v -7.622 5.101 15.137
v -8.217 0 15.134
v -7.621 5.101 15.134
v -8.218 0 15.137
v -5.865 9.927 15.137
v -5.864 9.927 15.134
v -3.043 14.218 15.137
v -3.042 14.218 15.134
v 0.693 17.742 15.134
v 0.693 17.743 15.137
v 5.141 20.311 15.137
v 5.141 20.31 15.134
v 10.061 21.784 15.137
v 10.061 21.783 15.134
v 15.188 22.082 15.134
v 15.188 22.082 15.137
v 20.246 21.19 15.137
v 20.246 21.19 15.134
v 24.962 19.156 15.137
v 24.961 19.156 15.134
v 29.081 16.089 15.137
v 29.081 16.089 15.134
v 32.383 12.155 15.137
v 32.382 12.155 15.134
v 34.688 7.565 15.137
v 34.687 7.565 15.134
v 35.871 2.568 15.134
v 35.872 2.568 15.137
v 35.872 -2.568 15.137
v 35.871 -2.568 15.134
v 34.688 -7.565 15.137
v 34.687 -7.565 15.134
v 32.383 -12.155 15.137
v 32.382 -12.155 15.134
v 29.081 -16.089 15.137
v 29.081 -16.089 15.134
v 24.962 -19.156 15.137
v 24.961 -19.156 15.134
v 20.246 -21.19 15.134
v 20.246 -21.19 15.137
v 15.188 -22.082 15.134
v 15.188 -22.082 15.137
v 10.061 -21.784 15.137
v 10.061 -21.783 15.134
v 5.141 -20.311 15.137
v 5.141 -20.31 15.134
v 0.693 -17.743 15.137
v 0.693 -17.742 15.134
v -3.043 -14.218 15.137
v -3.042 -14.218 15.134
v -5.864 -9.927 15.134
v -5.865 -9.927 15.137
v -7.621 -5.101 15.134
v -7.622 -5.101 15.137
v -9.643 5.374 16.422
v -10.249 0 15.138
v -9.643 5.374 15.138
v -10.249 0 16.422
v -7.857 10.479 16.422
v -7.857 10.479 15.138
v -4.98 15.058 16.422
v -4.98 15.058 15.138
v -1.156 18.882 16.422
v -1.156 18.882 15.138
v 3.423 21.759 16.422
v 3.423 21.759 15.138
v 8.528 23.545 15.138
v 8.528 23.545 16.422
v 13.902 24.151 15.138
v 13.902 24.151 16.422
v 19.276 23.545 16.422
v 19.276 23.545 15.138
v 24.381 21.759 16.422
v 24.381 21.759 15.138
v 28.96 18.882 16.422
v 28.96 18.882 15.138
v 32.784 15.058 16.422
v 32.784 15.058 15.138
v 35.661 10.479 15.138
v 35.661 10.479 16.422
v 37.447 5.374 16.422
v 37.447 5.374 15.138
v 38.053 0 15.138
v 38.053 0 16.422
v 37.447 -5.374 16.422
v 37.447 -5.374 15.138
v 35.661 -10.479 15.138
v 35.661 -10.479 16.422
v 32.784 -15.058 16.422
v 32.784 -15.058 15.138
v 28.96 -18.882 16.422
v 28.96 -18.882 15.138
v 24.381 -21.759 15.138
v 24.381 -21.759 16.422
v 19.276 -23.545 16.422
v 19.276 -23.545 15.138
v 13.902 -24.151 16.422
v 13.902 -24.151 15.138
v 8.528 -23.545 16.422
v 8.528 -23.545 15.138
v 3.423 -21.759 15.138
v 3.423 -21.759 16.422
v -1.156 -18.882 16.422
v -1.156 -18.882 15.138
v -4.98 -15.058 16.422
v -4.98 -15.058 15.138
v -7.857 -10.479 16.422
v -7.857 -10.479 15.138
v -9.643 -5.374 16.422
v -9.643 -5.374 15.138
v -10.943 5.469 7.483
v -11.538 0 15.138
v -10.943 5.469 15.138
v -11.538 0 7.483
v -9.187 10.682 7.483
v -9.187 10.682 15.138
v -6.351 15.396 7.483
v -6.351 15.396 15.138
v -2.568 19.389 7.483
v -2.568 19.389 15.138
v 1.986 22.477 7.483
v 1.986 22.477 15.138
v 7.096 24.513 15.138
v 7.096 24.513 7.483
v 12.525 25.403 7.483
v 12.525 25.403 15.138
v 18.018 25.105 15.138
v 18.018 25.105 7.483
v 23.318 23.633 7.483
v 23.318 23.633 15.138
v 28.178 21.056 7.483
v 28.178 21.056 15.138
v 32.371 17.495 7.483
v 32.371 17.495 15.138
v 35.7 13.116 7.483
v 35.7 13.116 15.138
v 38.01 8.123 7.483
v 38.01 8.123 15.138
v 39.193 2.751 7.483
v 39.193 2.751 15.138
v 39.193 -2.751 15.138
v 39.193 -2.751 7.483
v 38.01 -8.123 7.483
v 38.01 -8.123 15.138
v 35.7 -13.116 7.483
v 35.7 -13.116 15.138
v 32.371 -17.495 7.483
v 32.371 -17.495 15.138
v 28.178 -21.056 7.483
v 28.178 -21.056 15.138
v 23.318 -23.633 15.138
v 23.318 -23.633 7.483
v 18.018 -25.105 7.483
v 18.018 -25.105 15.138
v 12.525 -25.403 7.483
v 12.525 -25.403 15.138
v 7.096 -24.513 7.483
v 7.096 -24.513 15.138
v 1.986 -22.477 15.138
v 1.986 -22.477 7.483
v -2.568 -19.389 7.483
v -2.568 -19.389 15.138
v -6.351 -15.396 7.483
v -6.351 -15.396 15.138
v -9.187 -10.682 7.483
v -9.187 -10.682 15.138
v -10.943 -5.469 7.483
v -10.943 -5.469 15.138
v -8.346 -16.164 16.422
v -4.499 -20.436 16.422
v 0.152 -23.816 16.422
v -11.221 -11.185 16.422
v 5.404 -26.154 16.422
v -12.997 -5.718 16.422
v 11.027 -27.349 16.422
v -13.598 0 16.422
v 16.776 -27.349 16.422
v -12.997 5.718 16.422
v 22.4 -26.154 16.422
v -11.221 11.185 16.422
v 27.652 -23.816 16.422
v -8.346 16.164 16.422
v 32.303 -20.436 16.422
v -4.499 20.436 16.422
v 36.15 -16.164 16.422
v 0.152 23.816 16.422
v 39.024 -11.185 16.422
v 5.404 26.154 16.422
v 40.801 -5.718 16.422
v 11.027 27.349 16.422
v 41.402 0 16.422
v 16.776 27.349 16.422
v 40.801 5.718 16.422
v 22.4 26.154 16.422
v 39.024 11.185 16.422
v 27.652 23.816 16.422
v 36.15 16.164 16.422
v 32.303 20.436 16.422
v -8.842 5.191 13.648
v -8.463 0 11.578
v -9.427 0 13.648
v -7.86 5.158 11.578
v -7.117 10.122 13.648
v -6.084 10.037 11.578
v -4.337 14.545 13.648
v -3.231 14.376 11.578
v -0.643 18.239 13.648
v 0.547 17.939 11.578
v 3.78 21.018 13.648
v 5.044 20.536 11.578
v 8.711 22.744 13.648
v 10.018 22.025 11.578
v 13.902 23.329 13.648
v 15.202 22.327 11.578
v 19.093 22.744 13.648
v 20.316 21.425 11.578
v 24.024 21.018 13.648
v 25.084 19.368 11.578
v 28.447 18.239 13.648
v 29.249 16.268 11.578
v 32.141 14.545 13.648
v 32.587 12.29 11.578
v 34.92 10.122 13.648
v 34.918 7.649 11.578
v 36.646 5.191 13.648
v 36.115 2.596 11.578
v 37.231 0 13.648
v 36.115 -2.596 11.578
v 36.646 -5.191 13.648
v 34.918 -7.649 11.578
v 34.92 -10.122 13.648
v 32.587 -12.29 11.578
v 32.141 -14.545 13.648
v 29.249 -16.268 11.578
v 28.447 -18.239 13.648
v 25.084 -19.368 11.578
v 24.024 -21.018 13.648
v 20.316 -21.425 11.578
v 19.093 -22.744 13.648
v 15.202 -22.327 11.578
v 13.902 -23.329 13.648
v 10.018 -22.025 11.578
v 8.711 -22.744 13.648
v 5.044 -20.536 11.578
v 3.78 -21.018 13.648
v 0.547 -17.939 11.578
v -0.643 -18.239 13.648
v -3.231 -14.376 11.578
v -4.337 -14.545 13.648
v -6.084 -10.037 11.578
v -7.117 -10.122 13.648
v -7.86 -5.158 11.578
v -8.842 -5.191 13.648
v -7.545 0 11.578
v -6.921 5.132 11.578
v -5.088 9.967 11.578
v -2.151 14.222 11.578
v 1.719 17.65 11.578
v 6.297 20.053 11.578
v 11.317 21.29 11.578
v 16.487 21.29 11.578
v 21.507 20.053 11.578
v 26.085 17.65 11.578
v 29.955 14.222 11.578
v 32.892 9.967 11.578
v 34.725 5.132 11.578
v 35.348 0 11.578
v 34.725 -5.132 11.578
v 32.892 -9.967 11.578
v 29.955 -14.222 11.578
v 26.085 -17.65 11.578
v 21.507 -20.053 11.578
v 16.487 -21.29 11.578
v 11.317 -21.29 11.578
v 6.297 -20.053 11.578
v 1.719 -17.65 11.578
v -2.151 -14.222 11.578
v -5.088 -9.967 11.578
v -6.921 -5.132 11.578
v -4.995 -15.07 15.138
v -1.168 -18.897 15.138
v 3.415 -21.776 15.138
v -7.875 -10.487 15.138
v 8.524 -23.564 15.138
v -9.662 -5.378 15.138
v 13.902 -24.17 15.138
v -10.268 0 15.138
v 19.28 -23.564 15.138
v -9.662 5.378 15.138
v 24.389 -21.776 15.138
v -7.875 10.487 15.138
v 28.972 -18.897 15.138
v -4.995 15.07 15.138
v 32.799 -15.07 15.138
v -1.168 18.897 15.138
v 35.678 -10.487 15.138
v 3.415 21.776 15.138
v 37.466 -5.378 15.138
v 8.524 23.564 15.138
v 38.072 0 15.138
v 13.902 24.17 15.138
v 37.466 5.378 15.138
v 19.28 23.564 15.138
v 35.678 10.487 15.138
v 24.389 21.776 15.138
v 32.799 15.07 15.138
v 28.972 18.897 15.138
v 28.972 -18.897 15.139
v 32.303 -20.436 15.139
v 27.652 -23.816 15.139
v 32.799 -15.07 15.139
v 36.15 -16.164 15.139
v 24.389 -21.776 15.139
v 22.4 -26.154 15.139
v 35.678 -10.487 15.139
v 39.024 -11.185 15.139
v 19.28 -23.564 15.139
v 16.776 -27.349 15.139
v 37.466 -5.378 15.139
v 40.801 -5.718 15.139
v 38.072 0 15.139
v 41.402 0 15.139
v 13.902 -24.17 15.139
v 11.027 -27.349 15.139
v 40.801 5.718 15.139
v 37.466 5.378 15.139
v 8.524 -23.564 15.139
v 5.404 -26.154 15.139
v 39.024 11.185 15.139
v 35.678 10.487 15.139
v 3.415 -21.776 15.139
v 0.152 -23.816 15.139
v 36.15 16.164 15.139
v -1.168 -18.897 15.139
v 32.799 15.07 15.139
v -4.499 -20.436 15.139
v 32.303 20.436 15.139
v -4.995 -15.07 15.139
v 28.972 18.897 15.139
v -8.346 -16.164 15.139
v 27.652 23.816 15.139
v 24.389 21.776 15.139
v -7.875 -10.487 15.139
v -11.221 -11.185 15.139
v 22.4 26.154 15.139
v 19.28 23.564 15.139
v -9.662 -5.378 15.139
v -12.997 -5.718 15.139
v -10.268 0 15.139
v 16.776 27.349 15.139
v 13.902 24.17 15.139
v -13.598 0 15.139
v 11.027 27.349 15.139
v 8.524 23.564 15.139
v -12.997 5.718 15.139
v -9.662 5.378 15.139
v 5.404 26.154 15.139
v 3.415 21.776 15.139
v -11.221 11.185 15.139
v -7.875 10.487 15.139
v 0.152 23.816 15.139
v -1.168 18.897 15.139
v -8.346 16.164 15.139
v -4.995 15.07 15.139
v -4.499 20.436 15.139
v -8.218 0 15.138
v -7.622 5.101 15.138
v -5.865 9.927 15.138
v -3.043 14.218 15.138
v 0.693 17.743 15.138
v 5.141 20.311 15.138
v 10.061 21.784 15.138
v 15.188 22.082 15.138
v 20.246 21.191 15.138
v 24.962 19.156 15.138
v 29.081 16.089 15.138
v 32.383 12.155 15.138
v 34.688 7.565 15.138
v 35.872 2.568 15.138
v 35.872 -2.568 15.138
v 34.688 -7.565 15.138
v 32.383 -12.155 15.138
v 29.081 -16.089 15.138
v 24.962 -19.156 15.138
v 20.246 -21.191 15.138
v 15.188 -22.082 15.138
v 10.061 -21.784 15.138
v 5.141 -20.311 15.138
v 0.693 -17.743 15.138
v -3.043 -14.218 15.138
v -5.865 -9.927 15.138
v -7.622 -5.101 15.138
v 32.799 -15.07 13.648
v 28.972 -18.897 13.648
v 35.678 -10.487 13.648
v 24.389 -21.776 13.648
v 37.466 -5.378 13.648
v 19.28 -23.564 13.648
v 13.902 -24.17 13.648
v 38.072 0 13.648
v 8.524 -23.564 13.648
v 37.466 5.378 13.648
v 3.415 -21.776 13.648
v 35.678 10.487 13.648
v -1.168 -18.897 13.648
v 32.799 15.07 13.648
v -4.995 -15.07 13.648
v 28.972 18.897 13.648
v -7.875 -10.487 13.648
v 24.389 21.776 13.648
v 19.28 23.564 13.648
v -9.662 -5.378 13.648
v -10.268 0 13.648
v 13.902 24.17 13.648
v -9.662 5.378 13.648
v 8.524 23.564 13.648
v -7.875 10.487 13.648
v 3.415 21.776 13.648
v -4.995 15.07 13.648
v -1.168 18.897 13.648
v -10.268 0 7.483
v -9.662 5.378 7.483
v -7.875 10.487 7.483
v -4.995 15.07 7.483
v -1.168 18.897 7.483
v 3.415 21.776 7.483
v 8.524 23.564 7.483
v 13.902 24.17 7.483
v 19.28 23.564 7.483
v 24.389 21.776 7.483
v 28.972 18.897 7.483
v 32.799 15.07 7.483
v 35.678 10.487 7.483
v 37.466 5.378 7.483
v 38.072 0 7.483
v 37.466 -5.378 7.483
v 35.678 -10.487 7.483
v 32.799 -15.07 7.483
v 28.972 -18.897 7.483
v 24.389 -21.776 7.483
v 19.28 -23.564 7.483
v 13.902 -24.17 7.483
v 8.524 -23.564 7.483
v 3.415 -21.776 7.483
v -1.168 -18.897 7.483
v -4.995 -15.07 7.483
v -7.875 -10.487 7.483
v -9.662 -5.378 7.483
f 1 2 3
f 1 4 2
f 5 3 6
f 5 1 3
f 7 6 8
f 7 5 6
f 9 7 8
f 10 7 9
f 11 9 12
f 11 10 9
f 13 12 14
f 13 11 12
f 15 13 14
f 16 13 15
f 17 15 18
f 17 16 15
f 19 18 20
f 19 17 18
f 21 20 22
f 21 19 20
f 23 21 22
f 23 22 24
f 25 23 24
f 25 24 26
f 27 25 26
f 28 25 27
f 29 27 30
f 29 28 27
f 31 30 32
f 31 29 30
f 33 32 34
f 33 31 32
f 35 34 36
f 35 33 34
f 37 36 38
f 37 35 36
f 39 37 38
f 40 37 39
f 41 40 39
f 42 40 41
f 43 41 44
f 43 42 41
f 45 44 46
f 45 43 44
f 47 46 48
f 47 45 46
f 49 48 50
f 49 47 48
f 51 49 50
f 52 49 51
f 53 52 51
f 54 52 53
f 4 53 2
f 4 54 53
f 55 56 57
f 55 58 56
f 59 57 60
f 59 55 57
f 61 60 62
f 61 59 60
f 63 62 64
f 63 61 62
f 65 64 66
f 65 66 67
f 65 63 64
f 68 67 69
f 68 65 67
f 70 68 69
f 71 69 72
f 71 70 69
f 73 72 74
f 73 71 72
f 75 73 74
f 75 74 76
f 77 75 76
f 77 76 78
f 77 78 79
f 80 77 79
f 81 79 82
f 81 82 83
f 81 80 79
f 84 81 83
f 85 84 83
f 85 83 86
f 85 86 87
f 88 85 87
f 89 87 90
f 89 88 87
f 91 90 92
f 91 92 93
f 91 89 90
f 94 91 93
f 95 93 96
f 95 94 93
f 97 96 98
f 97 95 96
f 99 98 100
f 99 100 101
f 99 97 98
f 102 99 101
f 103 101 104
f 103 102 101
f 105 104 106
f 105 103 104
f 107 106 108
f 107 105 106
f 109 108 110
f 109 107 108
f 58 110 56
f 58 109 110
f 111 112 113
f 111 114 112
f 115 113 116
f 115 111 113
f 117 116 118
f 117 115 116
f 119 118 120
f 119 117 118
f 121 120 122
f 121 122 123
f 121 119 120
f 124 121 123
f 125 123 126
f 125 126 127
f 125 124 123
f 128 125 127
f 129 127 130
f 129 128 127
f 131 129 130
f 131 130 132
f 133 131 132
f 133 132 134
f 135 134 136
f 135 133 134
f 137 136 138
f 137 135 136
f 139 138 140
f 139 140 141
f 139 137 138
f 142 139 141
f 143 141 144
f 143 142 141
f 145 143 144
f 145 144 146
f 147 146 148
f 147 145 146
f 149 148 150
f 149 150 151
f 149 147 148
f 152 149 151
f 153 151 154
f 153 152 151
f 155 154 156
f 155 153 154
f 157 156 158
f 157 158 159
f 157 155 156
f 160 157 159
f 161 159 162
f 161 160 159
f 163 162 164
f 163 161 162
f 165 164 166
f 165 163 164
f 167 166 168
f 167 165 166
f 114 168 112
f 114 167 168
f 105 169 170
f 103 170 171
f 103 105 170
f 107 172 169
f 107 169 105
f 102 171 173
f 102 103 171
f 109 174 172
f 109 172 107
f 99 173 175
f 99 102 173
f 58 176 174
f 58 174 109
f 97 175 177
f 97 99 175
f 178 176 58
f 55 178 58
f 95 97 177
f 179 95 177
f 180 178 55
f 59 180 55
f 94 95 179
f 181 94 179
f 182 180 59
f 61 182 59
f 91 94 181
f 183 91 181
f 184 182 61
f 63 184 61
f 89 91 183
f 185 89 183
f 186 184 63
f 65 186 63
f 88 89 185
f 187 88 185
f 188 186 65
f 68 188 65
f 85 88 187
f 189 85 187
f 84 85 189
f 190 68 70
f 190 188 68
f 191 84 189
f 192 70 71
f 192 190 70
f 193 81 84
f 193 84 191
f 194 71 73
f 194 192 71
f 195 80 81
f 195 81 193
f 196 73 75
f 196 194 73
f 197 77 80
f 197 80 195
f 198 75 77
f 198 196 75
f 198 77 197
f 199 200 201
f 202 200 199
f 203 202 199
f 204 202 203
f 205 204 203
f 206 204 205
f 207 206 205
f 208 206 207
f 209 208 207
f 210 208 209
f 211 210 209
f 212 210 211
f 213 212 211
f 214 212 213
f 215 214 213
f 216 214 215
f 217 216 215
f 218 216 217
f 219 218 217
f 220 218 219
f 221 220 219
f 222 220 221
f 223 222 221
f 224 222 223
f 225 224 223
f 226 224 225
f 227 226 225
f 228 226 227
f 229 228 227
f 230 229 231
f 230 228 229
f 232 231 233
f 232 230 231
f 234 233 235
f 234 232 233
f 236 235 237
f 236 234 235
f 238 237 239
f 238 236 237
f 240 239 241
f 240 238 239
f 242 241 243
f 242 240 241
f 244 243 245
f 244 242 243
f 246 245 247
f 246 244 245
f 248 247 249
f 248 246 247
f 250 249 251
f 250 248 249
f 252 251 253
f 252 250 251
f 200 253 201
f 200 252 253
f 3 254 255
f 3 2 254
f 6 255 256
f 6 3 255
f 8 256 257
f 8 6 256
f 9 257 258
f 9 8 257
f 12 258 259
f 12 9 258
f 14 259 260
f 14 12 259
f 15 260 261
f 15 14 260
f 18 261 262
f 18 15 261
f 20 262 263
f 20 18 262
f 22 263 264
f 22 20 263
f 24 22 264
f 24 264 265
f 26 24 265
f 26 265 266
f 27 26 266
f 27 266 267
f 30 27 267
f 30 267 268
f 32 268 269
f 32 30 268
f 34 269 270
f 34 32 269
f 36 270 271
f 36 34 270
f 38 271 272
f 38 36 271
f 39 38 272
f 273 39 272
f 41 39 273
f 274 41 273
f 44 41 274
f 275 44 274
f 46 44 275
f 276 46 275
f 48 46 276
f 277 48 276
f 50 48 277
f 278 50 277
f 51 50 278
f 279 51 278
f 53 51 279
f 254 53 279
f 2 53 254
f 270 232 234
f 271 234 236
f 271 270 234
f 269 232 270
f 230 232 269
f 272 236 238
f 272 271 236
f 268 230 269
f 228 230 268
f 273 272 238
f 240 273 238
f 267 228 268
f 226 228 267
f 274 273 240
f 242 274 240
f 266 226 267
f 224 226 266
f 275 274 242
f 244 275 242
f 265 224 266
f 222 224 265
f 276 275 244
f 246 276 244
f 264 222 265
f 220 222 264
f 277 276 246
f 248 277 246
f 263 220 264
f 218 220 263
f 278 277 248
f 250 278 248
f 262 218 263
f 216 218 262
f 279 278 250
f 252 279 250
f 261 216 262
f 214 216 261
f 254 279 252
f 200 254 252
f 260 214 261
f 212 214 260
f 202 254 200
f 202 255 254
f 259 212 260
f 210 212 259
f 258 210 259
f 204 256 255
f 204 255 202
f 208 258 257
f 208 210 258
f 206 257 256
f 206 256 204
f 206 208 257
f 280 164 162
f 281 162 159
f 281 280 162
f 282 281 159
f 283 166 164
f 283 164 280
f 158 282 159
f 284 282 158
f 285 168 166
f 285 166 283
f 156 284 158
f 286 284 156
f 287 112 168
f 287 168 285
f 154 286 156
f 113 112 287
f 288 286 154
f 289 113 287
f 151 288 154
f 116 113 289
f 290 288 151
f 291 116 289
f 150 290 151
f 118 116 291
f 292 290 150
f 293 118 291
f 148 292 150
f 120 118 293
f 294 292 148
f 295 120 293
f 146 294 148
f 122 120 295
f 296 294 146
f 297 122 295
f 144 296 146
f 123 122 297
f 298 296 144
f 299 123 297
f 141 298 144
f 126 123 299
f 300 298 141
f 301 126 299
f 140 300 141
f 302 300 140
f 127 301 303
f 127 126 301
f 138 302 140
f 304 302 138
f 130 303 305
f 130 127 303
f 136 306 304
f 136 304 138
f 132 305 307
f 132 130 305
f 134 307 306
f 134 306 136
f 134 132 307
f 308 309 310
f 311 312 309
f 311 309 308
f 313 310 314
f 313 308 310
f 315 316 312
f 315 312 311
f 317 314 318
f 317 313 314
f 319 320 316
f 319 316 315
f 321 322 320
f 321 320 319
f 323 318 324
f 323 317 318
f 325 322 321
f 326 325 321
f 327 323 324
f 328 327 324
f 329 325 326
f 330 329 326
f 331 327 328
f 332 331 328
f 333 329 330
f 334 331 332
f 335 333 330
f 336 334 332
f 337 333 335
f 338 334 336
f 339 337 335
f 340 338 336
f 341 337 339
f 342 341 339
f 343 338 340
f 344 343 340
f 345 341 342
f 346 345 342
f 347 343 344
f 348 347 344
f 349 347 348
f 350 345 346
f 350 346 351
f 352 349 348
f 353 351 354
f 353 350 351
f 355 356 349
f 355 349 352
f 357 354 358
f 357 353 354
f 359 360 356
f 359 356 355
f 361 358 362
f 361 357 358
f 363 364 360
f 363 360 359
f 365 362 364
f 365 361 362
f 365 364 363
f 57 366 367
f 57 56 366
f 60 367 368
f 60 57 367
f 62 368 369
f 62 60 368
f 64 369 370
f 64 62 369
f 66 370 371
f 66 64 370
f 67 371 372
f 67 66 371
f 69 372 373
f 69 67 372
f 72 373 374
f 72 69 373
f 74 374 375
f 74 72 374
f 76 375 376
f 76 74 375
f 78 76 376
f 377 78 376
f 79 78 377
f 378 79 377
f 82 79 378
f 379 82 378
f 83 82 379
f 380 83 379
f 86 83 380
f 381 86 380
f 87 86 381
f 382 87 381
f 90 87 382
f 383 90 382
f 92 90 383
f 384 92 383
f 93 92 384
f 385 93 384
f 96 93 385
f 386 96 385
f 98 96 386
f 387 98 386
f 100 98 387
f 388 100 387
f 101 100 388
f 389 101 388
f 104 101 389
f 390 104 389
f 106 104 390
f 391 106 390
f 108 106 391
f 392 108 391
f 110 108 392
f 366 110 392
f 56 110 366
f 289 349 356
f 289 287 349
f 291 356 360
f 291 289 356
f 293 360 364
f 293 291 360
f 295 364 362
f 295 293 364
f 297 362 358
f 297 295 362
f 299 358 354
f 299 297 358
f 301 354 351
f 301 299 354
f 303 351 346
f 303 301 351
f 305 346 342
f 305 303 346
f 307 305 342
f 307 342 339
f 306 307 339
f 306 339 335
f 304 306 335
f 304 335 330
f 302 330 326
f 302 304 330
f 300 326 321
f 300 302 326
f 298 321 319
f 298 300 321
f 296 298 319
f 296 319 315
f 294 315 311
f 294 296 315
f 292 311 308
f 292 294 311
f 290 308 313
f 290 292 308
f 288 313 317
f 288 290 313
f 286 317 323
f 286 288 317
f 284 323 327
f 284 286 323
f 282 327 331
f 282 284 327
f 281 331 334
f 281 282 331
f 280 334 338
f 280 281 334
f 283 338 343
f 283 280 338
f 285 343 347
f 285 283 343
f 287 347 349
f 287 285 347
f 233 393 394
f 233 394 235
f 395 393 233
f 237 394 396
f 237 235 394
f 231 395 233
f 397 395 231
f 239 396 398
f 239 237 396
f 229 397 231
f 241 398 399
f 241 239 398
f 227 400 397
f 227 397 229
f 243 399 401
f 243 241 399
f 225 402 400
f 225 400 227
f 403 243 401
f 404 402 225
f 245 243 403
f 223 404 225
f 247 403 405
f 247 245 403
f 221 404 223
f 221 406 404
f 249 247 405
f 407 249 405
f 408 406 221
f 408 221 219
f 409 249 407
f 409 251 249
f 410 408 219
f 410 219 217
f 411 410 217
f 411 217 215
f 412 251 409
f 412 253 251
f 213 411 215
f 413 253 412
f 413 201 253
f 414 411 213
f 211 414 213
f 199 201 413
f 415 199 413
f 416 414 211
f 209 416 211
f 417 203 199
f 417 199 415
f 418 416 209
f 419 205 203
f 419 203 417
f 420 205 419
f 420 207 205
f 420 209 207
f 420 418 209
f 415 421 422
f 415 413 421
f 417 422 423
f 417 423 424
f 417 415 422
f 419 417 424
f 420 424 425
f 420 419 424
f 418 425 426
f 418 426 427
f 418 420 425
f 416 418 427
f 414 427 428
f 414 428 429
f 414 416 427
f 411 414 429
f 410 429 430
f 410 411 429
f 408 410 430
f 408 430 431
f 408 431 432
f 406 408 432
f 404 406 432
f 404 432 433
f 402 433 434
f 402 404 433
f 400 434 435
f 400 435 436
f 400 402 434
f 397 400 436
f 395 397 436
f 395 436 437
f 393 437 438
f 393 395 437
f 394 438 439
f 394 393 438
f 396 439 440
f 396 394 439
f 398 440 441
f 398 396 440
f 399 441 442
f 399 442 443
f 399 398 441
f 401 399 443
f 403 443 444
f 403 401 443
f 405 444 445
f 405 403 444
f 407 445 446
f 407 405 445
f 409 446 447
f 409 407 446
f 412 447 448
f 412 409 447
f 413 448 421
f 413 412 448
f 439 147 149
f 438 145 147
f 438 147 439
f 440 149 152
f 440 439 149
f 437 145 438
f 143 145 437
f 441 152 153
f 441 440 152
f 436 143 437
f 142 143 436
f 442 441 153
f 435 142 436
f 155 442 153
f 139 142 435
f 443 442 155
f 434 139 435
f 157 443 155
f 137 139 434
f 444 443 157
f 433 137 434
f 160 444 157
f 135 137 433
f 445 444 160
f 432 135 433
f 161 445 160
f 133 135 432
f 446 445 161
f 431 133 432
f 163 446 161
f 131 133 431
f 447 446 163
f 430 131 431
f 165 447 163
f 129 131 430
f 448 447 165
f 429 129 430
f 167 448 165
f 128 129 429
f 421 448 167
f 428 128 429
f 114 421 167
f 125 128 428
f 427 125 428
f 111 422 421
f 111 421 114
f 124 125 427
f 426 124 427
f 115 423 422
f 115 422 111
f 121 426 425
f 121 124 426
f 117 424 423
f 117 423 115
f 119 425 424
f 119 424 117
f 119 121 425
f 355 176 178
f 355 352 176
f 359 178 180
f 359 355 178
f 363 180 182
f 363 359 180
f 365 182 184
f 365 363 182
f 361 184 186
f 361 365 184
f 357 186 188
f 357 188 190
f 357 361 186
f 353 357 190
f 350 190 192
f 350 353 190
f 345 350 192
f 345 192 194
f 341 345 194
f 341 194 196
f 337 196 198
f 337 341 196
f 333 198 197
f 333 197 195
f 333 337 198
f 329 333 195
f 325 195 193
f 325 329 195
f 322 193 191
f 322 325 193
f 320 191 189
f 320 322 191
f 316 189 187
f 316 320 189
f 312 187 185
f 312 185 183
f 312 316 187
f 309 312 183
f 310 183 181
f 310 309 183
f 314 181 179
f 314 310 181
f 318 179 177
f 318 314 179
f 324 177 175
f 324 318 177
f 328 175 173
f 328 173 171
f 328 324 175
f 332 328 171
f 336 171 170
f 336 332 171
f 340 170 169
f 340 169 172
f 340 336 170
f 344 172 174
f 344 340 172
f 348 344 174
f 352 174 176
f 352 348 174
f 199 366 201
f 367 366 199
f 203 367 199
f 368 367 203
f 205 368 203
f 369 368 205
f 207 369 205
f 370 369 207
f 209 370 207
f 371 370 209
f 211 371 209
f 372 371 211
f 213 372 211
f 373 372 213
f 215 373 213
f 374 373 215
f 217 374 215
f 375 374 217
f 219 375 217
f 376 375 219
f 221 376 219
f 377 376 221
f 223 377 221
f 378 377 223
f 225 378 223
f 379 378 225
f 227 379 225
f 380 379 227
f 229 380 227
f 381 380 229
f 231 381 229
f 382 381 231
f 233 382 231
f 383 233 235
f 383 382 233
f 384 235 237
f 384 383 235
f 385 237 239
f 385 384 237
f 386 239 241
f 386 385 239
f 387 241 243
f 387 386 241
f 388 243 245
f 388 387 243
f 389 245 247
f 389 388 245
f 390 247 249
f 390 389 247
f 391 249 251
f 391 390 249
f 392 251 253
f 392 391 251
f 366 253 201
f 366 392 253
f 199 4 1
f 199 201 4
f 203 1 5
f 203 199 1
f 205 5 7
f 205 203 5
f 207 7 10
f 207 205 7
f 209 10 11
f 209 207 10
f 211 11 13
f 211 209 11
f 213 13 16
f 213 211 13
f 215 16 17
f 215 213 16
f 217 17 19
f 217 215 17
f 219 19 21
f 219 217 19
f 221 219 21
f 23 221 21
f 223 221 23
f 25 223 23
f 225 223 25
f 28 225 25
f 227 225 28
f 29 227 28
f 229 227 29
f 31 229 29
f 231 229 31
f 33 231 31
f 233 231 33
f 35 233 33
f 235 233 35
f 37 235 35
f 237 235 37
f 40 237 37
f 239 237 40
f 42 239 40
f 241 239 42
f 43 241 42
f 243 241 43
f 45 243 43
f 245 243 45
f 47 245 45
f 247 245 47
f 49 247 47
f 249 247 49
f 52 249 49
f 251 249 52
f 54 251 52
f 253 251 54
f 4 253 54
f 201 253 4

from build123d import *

# Parameters (mm, degrees)
F0_W = 1.2508329971
F0_H = 1.489882911


# Not quite as in the source:
# - ends of sketch curves that miss each other by under 0.0002 mm in the source are joined


with BuildPart() as f1:
    # F0 (on Front) → F1 (revolve)
    with BuildSketch(Plane.XZ):
        Polygon((-10.2681356725, 15.1391583099), (-10.2681356725, 15.1379262976), (-10.2489686697, 15.1379262976), (-10.2489686697, 16.4217564627), (-10.2681356725, 16.4217564627), (-13.5981356725, 16.4217564627), (-13.5981356725, 15.1391583099), (-11.5381356725, 15.1391583099), align=None)
        with Locations((-10.8935521711, 14.3929848421)):
            Rectangle(F0_W, F0_H)
        Polygon((-10.2489686697, 15.1379262976), (-10.2681356725, 15.1379262976), (-10.2681356725, 13.6480433866), (-9.4267865643, 13.6480433866), (-8.2180183381, 15.1380142197), align=None)
        Polygon((-11.5189686697, 13.6480433866), (-11.5189686697, 15.1379262976), (-11.5381356725, 15.1379262976), (-11.5381356725, 7.4834876391), (-10.2681356725, 7.4834876391), (-10.2681356725, 13.6480433866), align=None)
    revolve(axis=Axis((13.9018643275, 0, 9.1203928459), (0, 0, -1)))


with BuildPart() as f1b:
    # F0 (on Front) → F1, piece 2 (revolve)
    with BuildSketch(Plane.XZ):
        Polygon((-8.2171776903, 13.6480433866), (-9.4267865643, 13.6480433866), (-8.4628937766, 11.5783596411), (-7.5445417837, 11.5783596411), (-8.2171776903, 15.1335709829), align=None)
        Polygon((-8.2178459705, 15.1371031726), (-9.4267865643, 13.6480433866), (-8.2171776903, 13.6480433866), (-8.2171776903, 15.1335709829), align=None)
    revolve(axis=Axis((13.9018643275, 0, 9.1203928459), (0, 0, -1)))


solid = Compound([f1.part, f1b.part])
